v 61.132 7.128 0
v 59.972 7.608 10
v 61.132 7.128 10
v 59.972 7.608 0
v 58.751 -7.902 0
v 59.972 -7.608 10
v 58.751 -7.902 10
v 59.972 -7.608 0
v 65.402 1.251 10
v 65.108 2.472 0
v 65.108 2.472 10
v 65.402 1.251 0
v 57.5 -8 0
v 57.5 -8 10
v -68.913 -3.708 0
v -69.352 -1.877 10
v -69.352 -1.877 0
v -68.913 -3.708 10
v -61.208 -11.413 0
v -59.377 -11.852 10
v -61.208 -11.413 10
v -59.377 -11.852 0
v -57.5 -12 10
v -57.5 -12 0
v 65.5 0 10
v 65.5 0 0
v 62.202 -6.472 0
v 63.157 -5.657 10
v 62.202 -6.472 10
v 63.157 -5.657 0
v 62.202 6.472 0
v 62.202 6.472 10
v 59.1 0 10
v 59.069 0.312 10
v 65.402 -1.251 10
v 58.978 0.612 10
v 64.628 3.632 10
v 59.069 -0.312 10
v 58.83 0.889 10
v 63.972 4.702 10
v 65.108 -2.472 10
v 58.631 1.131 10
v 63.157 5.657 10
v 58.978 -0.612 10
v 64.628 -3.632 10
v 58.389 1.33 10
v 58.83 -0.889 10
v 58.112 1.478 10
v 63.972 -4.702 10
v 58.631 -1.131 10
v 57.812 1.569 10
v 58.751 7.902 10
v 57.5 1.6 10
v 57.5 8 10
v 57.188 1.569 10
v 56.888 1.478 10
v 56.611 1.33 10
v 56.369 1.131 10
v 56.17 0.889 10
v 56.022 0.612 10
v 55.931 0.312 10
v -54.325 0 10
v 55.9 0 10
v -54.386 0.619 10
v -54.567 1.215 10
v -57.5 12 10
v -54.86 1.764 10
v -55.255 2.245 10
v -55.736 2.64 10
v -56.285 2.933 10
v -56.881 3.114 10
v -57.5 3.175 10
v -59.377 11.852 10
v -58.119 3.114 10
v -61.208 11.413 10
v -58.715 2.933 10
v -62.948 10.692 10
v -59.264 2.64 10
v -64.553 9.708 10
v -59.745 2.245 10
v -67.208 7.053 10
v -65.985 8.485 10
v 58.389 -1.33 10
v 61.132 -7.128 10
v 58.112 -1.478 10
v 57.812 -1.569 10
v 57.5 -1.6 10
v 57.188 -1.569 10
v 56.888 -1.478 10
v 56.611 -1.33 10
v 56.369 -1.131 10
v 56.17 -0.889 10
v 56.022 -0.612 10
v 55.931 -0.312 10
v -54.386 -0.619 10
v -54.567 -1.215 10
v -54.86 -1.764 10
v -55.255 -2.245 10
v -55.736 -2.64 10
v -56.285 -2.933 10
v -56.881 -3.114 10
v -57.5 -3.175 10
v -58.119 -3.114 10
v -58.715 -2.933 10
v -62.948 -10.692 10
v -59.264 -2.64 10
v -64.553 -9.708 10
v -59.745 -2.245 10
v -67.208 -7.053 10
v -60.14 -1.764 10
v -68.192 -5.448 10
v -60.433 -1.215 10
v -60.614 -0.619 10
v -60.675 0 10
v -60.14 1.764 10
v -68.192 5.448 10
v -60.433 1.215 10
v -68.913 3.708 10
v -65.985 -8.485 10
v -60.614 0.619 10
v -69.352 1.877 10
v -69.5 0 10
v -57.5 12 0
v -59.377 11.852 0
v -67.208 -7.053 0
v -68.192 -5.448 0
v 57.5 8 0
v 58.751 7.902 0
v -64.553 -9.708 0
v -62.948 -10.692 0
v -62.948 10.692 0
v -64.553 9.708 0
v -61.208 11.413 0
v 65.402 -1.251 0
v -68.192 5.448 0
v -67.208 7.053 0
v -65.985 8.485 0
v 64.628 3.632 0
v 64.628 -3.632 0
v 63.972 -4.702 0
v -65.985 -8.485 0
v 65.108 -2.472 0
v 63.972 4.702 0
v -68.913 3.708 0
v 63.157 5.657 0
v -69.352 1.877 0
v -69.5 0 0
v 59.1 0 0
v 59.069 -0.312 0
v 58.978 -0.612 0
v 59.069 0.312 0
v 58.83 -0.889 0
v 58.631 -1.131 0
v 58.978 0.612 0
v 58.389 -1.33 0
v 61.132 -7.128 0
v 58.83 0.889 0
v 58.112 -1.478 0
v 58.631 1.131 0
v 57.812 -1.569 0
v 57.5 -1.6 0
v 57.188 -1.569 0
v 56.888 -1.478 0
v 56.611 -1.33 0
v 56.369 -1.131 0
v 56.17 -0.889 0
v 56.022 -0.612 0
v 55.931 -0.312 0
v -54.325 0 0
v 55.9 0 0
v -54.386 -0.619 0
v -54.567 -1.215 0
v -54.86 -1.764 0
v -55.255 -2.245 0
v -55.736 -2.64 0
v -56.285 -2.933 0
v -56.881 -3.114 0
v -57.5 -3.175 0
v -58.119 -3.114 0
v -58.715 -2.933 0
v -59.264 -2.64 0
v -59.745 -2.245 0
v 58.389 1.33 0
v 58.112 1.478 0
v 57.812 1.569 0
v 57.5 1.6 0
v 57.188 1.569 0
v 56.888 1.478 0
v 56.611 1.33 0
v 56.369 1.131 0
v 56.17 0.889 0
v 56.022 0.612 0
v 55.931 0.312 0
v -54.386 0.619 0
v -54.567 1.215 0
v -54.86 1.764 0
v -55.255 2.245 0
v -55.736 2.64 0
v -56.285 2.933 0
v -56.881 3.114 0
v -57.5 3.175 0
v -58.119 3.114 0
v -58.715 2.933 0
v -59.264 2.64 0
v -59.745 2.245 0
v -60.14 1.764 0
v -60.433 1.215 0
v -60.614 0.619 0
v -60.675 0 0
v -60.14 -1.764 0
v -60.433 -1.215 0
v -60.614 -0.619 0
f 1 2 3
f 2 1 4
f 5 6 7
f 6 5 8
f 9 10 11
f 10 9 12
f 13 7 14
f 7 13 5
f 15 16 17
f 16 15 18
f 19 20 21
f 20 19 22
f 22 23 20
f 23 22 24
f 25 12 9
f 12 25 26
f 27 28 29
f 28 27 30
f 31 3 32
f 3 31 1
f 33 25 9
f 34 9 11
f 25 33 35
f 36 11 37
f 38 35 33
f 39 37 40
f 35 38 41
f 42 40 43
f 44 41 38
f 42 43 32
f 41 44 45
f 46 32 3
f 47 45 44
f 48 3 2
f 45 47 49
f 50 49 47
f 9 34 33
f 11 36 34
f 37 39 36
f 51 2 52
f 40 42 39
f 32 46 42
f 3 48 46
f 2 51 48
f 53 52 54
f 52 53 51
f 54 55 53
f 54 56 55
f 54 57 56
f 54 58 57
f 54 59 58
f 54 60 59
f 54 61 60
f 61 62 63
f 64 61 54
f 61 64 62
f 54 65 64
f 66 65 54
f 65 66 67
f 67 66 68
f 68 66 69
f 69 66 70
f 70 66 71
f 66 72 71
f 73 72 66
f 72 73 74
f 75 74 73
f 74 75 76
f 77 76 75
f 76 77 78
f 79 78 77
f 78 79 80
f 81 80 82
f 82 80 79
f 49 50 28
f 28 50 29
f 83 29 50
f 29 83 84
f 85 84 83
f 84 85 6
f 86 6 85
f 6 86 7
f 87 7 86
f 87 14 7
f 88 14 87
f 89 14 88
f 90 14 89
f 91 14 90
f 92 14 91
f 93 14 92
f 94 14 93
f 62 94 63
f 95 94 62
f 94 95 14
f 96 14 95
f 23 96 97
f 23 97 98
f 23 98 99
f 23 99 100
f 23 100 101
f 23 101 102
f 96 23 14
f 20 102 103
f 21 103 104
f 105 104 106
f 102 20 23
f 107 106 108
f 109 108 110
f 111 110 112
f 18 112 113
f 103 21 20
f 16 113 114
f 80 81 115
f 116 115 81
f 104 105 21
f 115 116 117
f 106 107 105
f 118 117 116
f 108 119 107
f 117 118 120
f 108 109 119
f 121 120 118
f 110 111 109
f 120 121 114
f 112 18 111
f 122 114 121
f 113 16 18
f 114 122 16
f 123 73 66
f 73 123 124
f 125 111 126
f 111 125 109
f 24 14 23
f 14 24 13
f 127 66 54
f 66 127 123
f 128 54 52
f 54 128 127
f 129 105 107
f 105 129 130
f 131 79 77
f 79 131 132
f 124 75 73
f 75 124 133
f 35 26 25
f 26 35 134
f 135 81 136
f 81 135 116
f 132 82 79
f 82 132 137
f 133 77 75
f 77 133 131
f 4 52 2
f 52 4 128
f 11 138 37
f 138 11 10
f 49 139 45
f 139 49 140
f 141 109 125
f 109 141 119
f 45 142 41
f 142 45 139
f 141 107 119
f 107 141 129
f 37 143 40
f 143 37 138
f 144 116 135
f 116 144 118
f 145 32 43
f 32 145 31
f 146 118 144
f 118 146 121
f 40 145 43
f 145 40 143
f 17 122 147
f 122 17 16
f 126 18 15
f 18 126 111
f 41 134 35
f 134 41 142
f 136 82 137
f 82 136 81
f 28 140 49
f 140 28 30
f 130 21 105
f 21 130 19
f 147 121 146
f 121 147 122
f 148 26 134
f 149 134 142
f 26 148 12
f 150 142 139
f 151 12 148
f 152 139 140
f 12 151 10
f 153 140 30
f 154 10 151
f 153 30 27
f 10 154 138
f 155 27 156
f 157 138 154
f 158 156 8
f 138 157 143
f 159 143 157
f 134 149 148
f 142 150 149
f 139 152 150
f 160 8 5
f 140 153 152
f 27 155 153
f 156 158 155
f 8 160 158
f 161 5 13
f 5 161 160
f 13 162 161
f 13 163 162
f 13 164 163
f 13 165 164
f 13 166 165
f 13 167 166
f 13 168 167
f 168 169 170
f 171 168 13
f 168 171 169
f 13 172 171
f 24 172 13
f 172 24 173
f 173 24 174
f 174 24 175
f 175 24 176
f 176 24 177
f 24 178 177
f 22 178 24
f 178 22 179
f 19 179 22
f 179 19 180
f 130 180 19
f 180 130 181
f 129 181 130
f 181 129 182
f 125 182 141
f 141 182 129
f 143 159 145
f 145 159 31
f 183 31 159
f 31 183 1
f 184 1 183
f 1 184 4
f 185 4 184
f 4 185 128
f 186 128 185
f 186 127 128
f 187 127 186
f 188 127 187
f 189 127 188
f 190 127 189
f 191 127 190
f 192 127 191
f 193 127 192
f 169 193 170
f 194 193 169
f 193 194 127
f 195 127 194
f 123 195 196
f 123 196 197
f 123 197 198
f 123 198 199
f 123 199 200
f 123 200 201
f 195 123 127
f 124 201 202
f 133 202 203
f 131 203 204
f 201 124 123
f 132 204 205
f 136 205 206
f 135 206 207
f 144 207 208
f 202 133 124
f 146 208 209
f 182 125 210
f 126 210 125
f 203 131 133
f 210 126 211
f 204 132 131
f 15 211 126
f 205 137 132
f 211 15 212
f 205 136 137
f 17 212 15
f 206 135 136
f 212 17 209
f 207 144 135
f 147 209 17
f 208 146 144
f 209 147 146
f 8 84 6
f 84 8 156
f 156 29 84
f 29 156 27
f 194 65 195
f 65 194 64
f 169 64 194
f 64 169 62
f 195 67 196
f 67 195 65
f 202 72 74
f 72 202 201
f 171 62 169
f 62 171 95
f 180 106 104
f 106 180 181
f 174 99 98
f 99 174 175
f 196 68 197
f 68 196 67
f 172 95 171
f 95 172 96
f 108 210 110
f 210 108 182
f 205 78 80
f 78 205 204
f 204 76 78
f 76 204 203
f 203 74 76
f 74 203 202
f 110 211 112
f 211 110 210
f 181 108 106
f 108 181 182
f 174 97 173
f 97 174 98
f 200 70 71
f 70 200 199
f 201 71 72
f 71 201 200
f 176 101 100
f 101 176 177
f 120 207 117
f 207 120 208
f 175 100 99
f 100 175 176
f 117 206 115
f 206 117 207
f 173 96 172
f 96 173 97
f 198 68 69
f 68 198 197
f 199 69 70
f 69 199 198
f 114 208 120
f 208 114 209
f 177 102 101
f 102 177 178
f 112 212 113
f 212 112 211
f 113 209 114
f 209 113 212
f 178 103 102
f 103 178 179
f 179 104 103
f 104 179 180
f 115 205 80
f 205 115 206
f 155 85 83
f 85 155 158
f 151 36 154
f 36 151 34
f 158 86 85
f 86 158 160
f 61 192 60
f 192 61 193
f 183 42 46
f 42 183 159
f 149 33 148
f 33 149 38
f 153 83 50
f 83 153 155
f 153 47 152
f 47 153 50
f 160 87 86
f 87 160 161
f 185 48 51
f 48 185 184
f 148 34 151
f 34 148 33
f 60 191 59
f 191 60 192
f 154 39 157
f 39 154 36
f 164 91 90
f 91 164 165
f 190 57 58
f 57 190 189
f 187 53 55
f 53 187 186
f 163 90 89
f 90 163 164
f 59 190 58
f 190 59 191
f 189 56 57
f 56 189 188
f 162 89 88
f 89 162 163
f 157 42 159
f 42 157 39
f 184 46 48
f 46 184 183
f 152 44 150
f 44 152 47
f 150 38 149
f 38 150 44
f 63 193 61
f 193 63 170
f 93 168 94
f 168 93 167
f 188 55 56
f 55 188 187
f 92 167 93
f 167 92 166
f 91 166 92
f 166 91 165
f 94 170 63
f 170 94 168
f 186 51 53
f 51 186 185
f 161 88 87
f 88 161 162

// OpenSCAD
$fn = 32;

// ----------------------------------------------------------------------
// Lever: 115 mm between the bosses, 10 mm thick, smooth outline
// ----------------------------------------------------------------------

// --- parameters (mm) ---
lever_l = 115;            // distance between the boss centres
boss_a = 24;              // first boss diameter
boss_b = 16;              // second boss diameter
bore_a = 6.35;            // first bore
bore_b = 3.2;             // second bore
lever_t = 10;             // lever thickness

lever_profile = [[-69.5, 0], [-69.352, -1.877], [-68.913, -3.708], [-68.192, -5.448], [-67.208, -7.053], [-65.985, -8.485], [-64.553, -9.708], [-62.948, -10.692], [-61.208, -11.413], [-59.377, -11.852], [-57.5, -12], [57.5, -8], [58.751, -7.902], [59.972, -7.608], [61.132, -7.128], [62.202, -6.472], [63.157, -5.657], [63.972, -4.702], [64.628, -3.632], [65.108, -2.472], [65.402, -1.251], [65.5, 0], [65.402, 1.251], [65.108, 2.472], [64.628, 3.632], [63.972, 4.702], [63.157, 5.657], [62.202, 6.472], [61.132, 7.128], [59.972, 7.608], [58.751, 7.902], [57.5, 8], [-57.5, 12], [-59.377, 11.852], [-61.208, 11.413], [-62.948, 10.692], [-64.553, 9.708], [-65.985, 8.485], [-67.208, 7.053], [-68.192, 5.448], [-68.913, 3.708], [-69.352, 1.877]];

difference() {
  linear_extrude(height = lever_t) polygon(lever_profile);
  translate([-57.5, 0, -2.5]) cylinder(h = lever_t + 5, d = bore_a);
  translate([57.5, 0, -2.5]) cylinder(h = lever_t + 5, d = bore_b);
}
